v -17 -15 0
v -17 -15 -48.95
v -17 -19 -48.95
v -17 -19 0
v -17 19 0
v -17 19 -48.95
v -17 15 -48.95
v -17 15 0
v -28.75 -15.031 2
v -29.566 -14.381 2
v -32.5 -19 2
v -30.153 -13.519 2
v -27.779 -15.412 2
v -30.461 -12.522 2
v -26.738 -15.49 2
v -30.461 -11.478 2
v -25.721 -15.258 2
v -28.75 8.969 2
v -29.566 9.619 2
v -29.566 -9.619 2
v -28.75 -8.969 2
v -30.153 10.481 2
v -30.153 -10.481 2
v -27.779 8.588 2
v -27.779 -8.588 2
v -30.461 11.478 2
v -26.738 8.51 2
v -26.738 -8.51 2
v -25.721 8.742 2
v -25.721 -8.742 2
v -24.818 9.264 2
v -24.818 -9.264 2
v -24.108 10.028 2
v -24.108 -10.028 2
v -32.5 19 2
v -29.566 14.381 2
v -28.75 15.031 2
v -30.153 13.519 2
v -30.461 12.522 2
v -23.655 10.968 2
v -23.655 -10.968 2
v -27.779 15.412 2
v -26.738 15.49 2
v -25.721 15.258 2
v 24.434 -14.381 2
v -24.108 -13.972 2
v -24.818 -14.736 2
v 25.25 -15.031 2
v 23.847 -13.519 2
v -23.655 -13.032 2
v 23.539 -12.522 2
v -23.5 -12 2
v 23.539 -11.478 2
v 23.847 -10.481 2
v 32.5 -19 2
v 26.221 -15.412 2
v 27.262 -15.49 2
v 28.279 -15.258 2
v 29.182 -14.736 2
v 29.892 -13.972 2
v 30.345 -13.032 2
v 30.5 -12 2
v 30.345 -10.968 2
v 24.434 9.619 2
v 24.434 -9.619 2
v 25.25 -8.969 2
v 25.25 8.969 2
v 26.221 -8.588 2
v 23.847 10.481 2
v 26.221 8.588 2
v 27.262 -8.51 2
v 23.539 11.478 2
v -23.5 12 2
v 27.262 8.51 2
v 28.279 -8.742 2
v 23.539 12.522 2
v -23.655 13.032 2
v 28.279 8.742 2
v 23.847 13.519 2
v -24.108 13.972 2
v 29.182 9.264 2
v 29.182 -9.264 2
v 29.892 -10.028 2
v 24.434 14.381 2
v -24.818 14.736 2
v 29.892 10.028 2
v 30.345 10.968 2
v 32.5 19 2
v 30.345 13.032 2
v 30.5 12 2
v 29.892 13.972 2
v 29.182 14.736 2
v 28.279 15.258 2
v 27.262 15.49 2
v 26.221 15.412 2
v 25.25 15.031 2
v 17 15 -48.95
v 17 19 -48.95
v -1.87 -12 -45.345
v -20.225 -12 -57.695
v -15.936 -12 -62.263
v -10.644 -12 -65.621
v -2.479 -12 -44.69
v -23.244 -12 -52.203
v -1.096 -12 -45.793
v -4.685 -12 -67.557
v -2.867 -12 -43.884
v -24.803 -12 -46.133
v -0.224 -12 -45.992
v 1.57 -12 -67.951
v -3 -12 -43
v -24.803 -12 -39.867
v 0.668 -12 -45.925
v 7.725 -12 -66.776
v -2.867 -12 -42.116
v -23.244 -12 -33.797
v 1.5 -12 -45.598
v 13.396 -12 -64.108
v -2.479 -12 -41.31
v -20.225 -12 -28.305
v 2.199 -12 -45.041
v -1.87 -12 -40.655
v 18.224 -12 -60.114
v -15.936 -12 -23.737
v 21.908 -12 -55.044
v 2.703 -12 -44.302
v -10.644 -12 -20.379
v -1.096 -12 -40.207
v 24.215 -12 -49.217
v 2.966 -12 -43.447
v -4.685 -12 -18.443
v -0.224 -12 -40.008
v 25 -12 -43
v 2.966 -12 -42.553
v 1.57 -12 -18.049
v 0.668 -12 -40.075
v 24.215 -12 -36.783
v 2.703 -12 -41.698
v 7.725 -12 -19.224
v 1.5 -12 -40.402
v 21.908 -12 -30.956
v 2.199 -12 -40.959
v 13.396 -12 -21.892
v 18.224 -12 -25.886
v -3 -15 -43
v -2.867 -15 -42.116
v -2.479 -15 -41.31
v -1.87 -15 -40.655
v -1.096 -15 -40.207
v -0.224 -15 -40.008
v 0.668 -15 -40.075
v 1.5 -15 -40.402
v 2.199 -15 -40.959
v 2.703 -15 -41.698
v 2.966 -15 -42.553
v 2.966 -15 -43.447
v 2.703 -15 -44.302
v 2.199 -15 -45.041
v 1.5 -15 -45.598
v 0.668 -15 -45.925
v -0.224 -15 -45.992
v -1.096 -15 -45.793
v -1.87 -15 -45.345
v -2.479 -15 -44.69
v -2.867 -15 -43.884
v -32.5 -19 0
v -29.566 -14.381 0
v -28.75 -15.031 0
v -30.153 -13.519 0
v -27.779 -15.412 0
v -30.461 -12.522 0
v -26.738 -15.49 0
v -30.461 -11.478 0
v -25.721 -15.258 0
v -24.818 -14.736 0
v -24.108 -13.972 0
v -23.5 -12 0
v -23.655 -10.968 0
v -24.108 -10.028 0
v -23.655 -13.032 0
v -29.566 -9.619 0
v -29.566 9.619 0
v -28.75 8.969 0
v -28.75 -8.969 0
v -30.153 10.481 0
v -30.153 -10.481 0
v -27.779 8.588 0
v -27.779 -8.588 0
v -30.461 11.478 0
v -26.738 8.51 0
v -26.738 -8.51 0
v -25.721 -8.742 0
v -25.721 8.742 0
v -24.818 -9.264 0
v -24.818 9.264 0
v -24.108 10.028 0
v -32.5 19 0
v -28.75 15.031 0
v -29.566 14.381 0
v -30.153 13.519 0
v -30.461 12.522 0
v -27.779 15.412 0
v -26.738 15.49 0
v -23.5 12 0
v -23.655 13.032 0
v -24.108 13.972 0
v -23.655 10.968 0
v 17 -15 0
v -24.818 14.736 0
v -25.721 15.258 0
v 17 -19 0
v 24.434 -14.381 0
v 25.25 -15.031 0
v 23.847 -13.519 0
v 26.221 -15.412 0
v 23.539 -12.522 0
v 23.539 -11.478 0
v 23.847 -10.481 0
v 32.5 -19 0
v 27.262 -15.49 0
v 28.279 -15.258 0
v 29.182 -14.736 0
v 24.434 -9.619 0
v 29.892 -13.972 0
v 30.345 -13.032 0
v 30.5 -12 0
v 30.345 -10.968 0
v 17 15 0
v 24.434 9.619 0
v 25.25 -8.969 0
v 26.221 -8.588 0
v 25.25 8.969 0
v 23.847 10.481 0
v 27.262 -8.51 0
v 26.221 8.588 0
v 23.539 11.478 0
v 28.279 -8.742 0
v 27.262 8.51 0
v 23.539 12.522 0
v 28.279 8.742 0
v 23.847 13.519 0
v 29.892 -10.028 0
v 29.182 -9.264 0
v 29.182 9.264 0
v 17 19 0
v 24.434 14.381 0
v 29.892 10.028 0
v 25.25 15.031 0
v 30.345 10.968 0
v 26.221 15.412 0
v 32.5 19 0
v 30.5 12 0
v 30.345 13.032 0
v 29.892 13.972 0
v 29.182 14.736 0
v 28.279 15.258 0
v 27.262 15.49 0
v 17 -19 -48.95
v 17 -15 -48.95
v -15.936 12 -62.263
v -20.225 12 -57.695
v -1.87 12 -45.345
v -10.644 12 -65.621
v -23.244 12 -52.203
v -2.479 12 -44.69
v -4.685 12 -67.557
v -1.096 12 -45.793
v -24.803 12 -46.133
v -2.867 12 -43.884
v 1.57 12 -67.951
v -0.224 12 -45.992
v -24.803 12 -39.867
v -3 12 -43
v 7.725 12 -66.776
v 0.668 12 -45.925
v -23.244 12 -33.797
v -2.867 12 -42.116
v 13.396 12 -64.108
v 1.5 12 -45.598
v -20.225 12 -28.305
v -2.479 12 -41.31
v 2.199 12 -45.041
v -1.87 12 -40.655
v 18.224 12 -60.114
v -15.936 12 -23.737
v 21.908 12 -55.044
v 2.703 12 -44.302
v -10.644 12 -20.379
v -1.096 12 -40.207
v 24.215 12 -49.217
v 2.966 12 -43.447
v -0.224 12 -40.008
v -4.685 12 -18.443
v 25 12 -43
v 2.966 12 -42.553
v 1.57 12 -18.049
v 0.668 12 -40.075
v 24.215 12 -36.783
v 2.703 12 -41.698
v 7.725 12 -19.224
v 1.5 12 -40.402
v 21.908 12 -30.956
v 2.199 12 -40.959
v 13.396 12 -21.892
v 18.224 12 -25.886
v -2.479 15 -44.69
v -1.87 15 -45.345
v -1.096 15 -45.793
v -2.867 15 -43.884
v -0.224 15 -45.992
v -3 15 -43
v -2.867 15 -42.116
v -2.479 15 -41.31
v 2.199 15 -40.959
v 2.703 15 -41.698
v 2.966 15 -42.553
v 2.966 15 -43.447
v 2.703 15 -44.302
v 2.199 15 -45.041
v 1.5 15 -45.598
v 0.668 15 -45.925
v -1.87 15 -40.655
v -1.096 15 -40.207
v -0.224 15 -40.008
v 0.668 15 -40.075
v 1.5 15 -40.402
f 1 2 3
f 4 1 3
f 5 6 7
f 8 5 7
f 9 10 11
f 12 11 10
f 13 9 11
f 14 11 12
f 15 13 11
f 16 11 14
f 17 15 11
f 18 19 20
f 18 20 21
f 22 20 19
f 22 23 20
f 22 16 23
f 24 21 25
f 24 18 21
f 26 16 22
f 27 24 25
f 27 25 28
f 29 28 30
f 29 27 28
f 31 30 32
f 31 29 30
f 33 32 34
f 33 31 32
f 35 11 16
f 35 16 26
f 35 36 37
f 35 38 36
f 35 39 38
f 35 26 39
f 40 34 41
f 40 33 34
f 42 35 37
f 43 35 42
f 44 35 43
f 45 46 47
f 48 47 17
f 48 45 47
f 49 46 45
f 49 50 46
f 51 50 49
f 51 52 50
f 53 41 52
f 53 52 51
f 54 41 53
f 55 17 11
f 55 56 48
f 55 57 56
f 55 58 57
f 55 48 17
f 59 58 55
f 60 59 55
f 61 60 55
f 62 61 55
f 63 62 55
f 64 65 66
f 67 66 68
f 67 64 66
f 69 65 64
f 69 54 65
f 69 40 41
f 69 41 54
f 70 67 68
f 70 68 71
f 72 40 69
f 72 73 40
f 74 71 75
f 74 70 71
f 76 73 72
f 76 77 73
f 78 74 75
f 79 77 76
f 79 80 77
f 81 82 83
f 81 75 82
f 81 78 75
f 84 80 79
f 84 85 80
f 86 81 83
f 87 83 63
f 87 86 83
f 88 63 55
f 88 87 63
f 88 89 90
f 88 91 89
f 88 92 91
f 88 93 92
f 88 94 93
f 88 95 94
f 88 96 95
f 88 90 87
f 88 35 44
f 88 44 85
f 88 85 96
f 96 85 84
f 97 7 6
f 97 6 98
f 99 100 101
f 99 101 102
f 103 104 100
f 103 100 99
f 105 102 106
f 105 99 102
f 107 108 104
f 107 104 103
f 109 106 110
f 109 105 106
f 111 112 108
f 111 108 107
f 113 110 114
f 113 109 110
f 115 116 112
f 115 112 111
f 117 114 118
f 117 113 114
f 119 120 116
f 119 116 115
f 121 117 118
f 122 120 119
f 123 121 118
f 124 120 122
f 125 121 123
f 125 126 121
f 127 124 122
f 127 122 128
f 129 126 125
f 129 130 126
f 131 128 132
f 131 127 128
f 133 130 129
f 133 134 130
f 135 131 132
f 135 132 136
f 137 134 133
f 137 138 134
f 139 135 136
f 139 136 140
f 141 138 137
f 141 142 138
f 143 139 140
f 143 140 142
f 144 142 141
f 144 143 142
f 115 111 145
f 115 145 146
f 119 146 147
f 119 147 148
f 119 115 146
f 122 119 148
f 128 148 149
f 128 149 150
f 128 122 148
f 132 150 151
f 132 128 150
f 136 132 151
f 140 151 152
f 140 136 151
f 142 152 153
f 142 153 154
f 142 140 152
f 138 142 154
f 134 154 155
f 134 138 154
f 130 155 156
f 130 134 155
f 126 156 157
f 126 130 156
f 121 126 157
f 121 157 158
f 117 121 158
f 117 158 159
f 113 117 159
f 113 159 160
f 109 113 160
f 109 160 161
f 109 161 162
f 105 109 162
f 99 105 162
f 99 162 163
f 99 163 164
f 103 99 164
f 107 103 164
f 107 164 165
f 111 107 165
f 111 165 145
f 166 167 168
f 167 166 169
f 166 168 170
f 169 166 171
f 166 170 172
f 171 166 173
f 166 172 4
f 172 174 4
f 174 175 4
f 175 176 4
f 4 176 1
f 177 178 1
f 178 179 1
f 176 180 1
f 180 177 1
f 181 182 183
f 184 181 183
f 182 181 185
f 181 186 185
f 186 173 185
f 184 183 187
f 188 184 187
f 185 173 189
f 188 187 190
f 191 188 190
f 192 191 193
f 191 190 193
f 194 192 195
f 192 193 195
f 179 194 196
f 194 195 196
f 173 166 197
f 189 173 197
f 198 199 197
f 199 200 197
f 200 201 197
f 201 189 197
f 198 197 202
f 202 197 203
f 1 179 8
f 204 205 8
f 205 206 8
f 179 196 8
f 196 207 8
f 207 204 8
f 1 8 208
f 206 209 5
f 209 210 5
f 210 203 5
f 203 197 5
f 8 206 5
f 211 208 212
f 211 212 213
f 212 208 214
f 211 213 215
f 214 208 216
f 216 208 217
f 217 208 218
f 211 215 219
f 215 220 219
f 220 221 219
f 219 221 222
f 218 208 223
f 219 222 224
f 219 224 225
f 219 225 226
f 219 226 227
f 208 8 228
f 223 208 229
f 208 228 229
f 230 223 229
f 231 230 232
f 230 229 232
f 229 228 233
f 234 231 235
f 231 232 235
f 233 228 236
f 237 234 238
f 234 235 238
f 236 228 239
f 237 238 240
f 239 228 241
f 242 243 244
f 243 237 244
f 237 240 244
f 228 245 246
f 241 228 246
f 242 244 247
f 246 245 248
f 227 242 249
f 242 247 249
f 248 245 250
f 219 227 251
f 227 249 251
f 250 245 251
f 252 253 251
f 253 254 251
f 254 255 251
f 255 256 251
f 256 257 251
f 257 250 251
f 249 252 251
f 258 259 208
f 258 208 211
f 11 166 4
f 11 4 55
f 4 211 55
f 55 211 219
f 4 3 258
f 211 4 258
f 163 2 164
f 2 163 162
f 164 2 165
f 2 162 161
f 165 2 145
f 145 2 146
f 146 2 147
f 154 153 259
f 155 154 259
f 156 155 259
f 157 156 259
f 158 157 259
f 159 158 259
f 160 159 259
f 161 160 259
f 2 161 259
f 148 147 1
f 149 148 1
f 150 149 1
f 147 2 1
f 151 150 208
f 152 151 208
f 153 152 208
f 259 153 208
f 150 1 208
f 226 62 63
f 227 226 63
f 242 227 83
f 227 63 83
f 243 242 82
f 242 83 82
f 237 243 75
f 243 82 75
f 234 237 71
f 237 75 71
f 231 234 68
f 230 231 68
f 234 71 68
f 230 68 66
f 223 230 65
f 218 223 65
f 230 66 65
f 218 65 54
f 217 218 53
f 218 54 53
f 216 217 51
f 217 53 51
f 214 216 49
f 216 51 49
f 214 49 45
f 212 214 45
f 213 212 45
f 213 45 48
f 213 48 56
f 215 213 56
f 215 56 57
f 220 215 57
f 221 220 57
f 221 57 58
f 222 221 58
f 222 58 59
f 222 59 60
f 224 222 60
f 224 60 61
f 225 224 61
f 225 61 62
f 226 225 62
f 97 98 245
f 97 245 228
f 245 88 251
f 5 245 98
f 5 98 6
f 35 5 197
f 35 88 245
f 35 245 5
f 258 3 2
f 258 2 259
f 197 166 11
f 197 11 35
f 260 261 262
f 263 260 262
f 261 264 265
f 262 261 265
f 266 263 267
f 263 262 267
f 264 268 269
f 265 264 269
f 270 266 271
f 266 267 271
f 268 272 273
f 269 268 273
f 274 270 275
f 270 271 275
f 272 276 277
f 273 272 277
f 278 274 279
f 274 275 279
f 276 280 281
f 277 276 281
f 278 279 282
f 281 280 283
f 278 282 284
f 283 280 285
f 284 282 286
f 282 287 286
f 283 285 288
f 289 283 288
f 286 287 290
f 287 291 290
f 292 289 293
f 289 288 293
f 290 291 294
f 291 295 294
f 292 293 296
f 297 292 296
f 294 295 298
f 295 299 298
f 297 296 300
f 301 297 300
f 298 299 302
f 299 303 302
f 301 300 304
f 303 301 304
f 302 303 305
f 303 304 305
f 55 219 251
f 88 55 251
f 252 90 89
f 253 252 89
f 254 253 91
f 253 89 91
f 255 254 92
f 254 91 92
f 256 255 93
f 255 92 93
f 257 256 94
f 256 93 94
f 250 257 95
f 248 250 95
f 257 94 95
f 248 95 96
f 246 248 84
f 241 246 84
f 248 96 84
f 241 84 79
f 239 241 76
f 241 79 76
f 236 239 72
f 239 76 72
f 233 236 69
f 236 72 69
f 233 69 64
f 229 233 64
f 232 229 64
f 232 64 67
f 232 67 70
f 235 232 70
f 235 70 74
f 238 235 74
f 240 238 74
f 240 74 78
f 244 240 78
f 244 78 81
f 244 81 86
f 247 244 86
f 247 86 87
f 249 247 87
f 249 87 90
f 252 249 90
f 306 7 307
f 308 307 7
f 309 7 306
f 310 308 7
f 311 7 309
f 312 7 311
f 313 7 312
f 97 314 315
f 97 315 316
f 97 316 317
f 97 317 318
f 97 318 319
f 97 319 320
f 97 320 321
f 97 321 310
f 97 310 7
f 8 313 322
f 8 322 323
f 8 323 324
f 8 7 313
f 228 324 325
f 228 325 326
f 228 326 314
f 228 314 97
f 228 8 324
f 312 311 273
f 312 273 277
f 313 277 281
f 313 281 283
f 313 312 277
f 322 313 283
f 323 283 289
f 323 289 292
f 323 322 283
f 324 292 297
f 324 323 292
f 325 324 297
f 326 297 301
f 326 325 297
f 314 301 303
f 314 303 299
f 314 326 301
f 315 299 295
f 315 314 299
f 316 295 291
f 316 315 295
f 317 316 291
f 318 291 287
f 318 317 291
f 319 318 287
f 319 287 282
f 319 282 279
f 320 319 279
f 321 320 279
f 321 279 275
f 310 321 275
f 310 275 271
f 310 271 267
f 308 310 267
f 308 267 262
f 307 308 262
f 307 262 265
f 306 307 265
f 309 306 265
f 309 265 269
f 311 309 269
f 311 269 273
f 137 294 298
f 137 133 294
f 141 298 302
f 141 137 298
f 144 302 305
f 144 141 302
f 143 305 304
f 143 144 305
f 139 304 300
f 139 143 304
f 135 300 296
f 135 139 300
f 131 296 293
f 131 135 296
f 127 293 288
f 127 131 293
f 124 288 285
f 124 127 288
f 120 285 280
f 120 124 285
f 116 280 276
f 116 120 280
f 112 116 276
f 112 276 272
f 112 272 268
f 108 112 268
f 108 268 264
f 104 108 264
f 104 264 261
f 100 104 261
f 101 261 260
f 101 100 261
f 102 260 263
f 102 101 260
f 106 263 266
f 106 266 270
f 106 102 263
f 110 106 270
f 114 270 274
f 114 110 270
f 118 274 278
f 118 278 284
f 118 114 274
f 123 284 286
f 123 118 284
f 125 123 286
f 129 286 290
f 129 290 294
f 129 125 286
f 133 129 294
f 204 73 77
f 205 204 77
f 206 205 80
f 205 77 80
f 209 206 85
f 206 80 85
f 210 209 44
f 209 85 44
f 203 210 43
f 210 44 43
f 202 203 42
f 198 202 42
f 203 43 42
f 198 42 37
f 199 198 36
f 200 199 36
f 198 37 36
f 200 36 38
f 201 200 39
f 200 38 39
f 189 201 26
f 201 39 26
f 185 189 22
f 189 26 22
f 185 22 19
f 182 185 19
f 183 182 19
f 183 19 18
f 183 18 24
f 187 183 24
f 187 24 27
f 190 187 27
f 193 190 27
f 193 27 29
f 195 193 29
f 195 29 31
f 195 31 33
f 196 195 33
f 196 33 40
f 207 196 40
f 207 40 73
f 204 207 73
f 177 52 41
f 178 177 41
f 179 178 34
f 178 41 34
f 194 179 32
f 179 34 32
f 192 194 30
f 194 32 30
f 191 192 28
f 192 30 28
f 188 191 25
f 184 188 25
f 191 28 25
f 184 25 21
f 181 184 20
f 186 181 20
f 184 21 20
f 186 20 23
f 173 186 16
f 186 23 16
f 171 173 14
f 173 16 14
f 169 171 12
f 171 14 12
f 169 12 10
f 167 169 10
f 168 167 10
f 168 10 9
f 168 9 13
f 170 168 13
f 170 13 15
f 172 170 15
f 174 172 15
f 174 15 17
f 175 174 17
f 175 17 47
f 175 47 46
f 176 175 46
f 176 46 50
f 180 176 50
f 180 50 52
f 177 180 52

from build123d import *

# Parameters (mm, degrees)
F0_W           = 65
F0_H           = 38
F1_DEPTH       = 2
F2_W           = 34
F2_H           = 4
F3_DEPTH       = 48.95
F5_R           = 3.5
F6_DEPTH       = 3000
F4_R           = 25
F7_DEPTH       = 12
F9_R           = 3
F10_DEPTH      = 38
F11_R          = 25
F12_DEPTH      = 12
F12_DEPTH_BACK = 12


with BuildPart() as f1:
    # F0 (on Top) → F1 (new body)
    with BuildSketch(Plane.XY):
        Rectangle(F0_W, F0_H)
    extrude(amount=F1_DEPTH)

    # F2 (on face) → F3 (join)
    with BuildSketch(Plane(origin=(0, 0, 0), x_dir=(1, 0, 0), z_dir=(0, 0, -1))):
        with Locations((0, 17)):
            Rectangle(F2_W, F2_H)
        with Locations((0, -17)):
            Rectangle(F2_W, F2_H)
    extrude(amount=F3_DEPTH)

    # F5 (on face) → F6 (cut)
    with BuildSketch(Plane.XY.offset(2)):
        with Locations((27, 12)):
            Circle(F5_R)
        with Locations((27, -12)):
            Circle(F5_R)
        with Locations((-27, -12)):
            Circle(F5_R)
        with Locations((-27, 12)):
            Circle(F5_R)
    extrude(amount=-F6_DEPTH, mode=Mode.SUBTRACT)

    # F9 (on face) → F10 (join)
    with BuildSketch(Plane(origin=(0, 19, 0), x_dir=(-1, 0, 0), z_dir=(0, 1, 0))):
        with Locations((0, -43)):
            Circle(F9_R)
    extrude(amount=-F10_DEPTH)

    # F11 (on Front) → F12 (join, two sides)
    with BuildSketch(Plane.XZ) as f12_sk:
        with Locations((0, -43)):
            Circle(F11_R)
    extrude(amount=F12_DEPTH)
    extrude(f12_sk.sketch, amount=-F12_DEPTH_BACK)


with BuildPart() as f7:
    # F4 (on Front) → F7 (new body, symmetric)
    with BuildSketch(Plane.XZ):
        with Locations((0, -43)):
            Circle(F4_R)
    extrude(amount=F7_DEPTH, both=True)


solid = f1.part
